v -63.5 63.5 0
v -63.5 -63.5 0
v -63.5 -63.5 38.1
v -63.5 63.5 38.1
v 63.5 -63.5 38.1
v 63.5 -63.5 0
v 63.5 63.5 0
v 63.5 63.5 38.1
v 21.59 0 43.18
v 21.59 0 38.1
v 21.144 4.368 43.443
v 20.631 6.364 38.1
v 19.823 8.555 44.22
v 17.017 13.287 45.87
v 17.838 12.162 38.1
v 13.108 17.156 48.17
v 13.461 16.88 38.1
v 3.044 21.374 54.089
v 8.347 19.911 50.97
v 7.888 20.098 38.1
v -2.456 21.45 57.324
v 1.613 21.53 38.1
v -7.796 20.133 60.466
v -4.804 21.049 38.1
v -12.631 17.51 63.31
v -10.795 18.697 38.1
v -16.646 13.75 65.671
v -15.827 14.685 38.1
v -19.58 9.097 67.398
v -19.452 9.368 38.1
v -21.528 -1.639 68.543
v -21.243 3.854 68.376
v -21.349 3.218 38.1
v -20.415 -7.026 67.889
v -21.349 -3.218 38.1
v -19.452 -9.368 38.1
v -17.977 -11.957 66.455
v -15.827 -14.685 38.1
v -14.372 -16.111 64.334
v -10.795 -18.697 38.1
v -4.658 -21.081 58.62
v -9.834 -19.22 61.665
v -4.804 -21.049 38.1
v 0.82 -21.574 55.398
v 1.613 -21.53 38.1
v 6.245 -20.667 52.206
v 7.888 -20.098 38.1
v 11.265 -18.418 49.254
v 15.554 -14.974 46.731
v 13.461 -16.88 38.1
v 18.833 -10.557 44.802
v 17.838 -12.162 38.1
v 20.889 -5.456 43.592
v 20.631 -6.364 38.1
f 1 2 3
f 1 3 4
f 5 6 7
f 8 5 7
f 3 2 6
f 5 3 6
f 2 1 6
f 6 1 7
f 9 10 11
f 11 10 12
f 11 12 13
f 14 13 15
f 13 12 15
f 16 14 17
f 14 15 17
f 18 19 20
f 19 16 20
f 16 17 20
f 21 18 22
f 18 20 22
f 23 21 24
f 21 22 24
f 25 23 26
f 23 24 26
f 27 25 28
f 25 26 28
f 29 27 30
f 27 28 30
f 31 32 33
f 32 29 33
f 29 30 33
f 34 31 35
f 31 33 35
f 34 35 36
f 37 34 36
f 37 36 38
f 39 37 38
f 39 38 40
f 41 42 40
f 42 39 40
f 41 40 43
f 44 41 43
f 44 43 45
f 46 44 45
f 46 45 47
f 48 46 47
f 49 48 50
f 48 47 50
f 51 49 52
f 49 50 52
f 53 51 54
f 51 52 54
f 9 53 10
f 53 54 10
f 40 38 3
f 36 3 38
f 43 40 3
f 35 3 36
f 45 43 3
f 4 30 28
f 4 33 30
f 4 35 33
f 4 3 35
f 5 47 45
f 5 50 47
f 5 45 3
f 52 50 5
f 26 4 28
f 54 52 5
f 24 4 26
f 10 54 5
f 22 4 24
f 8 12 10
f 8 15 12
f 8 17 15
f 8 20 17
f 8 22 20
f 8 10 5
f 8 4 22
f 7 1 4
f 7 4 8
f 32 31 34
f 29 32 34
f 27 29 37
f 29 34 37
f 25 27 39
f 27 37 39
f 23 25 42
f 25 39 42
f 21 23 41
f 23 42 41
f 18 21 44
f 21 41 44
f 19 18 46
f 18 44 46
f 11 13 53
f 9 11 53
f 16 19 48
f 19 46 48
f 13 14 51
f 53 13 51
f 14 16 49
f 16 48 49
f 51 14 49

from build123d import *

# Parameters (mm, degrees)
F0_W     = 127
F0_H     = 127
F1_DEPTH = 38.1
F2_R     = 21.59
F4_DEPTH = 30.48
F7_DEPTH = 1270


with BuildPart() as f1:
    # F0 (on Top) → F1 (new body)
    with BuildSketch(Plane.XY):
        Rectangle(F0_W, F0_H)
    extrude(amount=F1_DEPTH)

    # F2 (on face) → F4 (join)
    with BuildSketch(Plane.XY.offset(38.1)):
        Circle(F2_R)
    extrude(amount=F4_DEPTH)

    # F6 (on offset) → F7 (cut)
    with BuildSketch(Plane.XZ.offset(25.4)):
        Polygon((21.590049, 68.58), (-21.590006, 68.58), (21.590049, 43.18), align=None)
    extrude(amount=-F7_DEPTH, mode=Mode.SUBTRACT)


solid = f1.part
